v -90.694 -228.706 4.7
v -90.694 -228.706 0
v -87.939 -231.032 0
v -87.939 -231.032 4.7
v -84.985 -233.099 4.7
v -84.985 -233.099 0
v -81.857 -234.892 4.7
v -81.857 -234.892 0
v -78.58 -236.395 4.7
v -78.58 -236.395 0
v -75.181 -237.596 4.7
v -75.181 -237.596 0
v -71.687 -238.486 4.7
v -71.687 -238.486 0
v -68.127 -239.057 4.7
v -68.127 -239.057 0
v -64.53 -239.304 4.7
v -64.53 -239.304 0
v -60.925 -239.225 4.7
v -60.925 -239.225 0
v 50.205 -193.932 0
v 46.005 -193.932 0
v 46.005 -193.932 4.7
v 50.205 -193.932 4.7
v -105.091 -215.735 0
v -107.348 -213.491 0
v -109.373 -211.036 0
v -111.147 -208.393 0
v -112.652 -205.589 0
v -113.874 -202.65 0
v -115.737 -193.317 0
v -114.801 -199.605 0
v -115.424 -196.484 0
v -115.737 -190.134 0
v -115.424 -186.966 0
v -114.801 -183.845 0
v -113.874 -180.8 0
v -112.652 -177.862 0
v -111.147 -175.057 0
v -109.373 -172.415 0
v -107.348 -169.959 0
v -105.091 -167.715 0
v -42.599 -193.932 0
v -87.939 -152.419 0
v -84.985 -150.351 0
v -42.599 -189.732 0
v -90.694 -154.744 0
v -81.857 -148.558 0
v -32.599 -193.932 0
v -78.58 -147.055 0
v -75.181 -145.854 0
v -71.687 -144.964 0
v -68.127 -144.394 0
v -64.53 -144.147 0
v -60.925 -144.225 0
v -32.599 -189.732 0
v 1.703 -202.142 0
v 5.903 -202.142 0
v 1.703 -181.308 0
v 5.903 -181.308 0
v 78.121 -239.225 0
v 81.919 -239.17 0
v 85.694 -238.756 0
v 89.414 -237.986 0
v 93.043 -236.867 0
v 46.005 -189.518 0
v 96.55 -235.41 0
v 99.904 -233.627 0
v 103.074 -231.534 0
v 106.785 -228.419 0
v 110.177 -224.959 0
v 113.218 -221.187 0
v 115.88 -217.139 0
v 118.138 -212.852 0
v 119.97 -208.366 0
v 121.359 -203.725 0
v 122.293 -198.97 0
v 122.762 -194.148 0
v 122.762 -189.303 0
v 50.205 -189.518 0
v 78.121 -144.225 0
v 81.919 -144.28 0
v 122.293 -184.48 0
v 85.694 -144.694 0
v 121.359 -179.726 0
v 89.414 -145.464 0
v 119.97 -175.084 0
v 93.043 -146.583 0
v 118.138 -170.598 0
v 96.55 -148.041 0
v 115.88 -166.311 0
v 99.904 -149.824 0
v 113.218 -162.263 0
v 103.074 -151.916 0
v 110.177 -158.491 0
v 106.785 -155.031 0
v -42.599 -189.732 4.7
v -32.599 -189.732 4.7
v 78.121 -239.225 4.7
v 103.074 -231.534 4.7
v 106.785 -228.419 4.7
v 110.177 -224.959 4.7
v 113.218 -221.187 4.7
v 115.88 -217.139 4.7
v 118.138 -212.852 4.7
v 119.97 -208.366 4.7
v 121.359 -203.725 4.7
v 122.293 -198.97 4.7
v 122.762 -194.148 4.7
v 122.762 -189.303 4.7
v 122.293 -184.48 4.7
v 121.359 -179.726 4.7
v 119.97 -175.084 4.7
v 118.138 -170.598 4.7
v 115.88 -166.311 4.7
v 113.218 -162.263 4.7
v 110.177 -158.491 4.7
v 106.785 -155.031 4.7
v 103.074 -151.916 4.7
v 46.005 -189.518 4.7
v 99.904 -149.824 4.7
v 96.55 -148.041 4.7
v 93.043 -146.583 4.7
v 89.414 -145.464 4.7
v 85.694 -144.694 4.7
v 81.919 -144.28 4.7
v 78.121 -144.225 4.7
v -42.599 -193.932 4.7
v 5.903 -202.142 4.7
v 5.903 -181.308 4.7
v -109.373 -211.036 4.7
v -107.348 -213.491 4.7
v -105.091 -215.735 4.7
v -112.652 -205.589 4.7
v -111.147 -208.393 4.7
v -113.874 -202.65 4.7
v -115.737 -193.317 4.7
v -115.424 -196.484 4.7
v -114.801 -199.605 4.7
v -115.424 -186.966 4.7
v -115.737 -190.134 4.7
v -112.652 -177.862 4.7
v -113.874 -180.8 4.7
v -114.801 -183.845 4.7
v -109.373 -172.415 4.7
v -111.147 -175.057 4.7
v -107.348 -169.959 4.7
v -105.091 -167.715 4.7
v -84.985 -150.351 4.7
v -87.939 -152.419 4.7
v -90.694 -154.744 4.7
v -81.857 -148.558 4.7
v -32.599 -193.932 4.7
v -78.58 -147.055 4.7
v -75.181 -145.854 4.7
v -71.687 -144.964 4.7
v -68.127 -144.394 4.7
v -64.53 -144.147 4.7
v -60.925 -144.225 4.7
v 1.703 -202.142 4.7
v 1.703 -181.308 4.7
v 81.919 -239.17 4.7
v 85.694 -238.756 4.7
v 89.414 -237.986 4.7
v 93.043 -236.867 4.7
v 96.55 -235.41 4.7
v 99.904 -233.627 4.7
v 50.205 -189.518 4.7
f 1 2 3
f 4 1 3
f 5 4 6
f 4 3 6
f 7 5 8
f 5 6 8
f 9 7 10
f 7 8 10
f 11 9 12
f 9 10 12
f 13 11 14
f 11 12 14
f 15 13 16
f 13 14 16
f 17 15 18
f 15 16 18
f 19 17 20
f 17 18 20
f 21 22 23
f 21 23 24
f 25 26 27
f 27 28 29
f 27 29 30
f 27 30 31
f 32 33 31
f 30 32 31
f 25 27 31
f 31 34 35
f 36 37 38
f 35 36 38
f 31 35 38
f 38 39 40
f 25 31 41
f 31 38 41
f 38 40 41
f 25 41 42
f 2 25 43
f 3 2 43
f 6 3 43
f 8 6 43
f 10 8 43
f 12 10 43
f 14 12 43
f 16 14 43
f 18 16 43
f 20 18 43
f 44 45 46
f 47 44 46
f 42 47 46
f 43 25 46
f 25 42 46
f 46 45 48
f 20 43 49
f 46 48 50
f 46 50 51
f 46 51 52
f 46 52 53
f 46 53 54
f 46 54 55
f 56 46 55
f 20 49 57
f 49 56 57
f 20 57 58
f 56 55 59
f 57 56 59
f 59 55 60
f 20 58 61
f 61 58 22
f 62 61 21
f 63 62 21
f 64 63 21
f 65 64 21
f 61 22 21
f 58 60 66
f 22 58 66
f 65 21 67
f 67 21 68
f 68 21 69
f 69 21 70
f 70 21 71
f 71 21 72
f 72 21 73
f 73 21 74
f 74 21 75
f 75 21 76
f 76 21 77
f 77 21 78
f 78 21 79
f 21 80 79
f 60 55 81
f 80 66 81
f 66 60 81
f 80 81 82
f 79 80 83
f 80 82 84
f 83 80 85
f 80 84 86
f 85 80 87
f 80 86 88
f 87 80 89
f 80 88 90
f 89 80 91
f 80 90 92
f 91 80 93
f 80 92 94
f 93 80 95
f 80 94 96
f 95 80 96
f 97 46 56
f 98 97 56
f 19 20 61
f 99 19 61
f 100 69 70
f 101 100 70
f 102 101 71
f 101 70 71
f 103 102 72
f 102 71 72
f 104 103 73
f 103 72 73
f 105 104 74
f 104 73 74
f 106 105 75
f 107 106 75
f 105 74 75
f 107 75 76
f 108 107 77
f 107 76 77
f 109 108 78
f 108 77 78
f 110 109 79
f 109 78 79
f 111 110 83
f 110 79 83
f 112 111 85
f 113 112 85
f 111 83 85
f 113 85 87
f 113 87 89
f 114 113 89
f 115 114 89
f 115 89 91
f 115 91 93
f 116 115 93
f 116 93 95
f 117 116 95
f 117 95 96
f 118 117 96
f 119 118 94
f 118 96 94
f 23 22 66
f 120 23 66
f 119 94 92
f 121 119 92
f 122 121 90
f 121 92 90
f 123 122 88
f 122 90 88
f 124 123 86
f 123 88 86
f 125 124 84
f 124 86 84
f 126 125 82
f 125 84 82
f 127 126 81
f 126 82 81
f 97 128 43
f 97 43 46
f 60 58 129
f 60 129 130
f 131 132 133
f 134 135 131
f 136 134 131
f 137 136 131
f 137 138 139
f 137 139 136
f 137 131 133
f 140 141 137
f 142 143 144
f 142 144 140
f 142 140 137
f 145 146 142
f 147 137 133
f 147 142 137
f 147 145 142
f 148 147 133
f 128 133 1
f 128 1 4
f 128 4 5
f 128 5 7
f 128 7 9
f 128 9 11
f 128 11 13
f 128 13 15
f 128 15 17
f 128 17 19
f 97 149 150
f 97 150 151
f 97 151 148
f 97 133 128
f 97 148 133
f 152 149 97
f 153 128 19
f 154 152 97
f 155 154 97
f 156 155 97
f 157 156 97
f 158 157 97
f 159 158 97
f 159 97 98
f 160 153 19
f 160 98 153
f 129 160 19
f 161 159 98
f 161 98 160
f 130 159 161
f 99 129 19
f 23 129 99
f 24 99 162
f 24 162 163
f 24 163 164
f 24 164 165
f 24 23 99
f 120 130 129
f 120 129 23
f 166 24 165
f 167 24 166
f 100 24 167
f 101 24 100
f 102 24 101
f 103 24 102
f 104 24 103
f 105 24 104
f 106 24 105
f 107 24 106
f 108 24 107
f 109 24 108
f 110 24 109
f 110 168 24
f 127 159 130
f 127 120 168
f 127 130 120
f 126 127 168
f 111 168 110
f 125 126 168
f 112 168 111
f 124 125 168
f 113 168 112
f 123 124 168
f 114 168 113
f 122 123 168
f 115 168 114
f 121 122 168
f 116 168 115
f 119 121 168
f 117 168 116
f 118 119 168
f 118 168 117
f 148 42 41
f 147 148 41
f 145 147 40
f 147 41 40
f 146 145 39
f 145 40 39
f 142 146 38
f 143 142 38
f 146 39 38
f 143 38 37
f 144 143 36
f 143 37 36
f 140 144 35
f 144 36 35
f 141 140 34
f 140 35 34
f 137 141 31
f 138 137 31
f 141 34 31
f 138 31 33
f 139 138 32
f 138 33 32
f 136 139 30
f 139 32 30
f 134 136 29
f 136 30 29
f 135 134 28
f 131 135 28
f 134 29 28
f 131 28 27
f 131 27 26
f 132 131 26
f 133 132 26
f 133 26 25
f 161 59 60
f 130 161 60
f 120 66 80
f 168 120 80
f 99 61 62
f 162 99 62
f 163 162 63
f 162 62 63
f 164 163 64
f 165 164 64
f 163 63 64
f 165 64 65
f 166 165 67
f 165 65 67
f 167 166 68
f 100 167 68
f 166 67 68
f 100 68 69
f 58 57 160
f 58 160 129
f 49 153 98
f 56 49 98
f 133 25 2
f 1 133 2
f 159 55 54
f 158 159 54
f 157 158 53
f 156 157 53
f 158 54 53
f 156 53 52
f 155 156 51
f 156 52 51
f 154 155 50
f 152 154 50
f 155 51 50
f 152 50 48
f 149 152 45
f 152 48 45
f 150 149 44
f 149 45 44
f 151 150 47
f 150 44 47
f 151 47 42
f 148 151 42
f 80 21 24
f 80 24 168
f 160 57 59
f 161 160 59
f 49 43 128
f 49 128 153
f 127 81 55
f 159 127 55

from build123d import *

# Parameters (mm, degrees)
F0_W     = 10
F0_H     = 4.2
F0_W_2   = 4.2
F0_H_2   = 20.833438
F0_H_3   = 4.41329
F1_DEPTH = 4.7


with BuildPart() as f1:
    # F0 (on Top) → F1 (new body)
    with BuildSketch(Plane.XY):
        with BuildLine():
            Line((78.121078, -144.22512), (-60.925064, -144.22512))
            ThreePointArc((-60.925064, -144.22512), (-76.89389, -146.416032), (-90.693977, -154.744361))
            Line((-90.693977, -154.744361), (-105.090827, -167.714982))
            ThreePointArc((-105.090827, -167.714982), (-115.776615, -191.725119), (-105.090827, -215.735257))
            Line((-105.090827, -215.735257), (-90.693977, -228.705877))
            ThreePointArc((-90.693977, -228.705877), (-76.89389, -237.034207), (-60.925064, -239.225119))
            Line((-60.925064, -239.225119), (78.121078, -239.225119))
            ThreePointArc((78.121078, -239.225119), (91.241589, -237.469621), (103.073645, -231.533963))
            ThreePointArc((103.073645, -231.533963), (122.820448, -191.725119), (103.073645, -151.916276))
            ThreePointArc((103.073645, -151.916276), (91.241589, -145.980618), (78.121078, -144.22512))
        make_face()
        with Locations((-37.599309, -191.831764)):
            Rectangle(F0_W, F0_H, mode=Mode.SUBTRACT)
        with Locations((3.80295, -191.725119)):
            Rectangle(F0_W_2, F0_H_2, mode=Mode.SUBTRACT)
        with Locations((48.105208, -191.725119)):
            Rectangle(F0_W_2, F0_H_3, mode=Mode.SUBTRACT)
    extrude(amount=F1_DEPTH)


solid = f1.part
